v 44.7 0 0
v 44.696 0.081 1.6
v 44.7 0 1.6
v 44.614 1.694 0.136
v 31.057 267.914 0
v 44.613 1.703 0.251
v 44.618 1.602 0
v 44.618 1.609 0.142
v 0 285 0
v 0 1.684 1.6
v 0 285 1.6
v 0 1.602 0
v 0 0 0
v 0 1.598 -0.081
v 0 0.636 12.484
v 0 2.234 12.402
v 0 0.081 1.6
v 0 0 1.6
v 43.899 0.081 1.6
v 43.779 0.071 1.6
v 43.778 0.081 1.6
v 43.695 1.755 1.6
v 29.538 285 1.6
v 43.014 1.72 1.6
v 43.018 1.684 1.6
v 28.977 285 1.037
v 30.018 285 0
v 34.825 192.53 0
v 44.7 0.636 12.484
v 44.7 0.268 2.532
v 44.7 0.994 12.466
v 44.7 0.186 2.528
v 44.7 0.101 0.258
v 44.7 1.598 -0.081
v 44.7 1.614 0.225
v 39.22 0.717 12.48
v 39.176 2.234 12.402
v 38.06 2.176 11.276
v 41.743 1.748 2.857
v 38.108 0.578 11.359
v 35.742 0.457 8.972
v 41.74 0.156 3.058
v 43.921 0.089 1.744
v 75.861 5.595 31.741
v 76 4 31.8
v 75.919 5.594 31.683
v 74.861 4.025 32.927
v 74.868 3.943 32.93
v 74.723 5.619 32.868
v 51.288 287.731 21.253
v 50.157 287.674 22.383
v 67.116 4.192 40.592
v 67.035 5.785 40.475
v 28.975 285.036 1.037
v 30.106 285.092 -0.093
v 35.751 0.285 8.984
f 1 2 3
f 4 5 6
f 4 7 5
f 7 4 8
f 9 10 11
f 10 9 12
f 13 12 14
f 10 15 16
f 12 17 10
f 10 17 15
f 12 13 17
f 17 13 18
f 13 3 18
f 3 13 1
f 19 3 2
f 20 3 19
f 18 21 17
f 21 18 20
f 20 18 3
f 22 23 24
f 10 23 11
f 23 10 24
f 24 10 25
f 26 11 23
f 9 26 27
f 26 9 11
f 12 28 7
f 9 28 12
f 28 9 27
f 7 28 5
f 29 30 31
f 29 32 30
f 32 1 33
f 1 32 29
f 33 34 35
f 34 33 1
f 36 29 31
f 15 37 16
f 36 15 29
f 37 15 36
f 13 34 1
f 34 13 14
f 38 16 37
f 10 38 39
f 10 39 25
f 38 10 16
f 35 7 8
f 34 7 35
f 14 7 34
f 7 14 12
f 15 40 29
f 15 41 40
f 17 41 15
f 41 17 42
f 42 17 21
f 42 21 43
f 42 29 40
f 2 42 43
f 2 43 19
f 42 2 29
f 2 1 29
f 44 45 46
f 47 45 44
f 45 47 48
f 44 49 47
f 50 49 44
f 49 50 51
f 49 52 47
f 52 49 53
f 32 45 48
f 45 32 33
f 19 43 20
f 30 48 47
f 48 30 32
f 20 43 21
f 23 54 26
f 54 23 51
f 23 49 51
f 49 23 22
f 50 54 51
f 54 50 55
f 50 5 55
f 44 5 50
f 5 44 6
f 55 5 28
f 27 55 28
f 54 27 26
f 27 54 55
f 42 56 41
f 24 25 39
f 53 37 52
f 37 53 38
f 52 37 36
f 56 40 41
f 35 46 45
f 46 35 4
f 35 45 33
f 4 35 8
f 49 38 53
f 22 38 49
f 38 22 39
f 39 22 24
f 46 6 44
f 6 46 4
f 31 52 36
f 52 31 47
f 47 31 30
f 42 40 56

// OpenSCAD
angle = atan(271/(44.7-30.9));
echo(angle);

module face() {
    linear_extrude(1.6)
        polygon(points=[[0,0],[44.7,0],
            [44.7 - 285/tan(angle),285],[0,285]]);
    rotate([angle-90,0,0])
        cube([44.7, 1.6, 12.5], center = false);
}

face();
translate([44.7*2-13.4,4,44.7-12.9])
    rotate([-3.,-45,7.1])
        mirror([1,0,0])
            face();
